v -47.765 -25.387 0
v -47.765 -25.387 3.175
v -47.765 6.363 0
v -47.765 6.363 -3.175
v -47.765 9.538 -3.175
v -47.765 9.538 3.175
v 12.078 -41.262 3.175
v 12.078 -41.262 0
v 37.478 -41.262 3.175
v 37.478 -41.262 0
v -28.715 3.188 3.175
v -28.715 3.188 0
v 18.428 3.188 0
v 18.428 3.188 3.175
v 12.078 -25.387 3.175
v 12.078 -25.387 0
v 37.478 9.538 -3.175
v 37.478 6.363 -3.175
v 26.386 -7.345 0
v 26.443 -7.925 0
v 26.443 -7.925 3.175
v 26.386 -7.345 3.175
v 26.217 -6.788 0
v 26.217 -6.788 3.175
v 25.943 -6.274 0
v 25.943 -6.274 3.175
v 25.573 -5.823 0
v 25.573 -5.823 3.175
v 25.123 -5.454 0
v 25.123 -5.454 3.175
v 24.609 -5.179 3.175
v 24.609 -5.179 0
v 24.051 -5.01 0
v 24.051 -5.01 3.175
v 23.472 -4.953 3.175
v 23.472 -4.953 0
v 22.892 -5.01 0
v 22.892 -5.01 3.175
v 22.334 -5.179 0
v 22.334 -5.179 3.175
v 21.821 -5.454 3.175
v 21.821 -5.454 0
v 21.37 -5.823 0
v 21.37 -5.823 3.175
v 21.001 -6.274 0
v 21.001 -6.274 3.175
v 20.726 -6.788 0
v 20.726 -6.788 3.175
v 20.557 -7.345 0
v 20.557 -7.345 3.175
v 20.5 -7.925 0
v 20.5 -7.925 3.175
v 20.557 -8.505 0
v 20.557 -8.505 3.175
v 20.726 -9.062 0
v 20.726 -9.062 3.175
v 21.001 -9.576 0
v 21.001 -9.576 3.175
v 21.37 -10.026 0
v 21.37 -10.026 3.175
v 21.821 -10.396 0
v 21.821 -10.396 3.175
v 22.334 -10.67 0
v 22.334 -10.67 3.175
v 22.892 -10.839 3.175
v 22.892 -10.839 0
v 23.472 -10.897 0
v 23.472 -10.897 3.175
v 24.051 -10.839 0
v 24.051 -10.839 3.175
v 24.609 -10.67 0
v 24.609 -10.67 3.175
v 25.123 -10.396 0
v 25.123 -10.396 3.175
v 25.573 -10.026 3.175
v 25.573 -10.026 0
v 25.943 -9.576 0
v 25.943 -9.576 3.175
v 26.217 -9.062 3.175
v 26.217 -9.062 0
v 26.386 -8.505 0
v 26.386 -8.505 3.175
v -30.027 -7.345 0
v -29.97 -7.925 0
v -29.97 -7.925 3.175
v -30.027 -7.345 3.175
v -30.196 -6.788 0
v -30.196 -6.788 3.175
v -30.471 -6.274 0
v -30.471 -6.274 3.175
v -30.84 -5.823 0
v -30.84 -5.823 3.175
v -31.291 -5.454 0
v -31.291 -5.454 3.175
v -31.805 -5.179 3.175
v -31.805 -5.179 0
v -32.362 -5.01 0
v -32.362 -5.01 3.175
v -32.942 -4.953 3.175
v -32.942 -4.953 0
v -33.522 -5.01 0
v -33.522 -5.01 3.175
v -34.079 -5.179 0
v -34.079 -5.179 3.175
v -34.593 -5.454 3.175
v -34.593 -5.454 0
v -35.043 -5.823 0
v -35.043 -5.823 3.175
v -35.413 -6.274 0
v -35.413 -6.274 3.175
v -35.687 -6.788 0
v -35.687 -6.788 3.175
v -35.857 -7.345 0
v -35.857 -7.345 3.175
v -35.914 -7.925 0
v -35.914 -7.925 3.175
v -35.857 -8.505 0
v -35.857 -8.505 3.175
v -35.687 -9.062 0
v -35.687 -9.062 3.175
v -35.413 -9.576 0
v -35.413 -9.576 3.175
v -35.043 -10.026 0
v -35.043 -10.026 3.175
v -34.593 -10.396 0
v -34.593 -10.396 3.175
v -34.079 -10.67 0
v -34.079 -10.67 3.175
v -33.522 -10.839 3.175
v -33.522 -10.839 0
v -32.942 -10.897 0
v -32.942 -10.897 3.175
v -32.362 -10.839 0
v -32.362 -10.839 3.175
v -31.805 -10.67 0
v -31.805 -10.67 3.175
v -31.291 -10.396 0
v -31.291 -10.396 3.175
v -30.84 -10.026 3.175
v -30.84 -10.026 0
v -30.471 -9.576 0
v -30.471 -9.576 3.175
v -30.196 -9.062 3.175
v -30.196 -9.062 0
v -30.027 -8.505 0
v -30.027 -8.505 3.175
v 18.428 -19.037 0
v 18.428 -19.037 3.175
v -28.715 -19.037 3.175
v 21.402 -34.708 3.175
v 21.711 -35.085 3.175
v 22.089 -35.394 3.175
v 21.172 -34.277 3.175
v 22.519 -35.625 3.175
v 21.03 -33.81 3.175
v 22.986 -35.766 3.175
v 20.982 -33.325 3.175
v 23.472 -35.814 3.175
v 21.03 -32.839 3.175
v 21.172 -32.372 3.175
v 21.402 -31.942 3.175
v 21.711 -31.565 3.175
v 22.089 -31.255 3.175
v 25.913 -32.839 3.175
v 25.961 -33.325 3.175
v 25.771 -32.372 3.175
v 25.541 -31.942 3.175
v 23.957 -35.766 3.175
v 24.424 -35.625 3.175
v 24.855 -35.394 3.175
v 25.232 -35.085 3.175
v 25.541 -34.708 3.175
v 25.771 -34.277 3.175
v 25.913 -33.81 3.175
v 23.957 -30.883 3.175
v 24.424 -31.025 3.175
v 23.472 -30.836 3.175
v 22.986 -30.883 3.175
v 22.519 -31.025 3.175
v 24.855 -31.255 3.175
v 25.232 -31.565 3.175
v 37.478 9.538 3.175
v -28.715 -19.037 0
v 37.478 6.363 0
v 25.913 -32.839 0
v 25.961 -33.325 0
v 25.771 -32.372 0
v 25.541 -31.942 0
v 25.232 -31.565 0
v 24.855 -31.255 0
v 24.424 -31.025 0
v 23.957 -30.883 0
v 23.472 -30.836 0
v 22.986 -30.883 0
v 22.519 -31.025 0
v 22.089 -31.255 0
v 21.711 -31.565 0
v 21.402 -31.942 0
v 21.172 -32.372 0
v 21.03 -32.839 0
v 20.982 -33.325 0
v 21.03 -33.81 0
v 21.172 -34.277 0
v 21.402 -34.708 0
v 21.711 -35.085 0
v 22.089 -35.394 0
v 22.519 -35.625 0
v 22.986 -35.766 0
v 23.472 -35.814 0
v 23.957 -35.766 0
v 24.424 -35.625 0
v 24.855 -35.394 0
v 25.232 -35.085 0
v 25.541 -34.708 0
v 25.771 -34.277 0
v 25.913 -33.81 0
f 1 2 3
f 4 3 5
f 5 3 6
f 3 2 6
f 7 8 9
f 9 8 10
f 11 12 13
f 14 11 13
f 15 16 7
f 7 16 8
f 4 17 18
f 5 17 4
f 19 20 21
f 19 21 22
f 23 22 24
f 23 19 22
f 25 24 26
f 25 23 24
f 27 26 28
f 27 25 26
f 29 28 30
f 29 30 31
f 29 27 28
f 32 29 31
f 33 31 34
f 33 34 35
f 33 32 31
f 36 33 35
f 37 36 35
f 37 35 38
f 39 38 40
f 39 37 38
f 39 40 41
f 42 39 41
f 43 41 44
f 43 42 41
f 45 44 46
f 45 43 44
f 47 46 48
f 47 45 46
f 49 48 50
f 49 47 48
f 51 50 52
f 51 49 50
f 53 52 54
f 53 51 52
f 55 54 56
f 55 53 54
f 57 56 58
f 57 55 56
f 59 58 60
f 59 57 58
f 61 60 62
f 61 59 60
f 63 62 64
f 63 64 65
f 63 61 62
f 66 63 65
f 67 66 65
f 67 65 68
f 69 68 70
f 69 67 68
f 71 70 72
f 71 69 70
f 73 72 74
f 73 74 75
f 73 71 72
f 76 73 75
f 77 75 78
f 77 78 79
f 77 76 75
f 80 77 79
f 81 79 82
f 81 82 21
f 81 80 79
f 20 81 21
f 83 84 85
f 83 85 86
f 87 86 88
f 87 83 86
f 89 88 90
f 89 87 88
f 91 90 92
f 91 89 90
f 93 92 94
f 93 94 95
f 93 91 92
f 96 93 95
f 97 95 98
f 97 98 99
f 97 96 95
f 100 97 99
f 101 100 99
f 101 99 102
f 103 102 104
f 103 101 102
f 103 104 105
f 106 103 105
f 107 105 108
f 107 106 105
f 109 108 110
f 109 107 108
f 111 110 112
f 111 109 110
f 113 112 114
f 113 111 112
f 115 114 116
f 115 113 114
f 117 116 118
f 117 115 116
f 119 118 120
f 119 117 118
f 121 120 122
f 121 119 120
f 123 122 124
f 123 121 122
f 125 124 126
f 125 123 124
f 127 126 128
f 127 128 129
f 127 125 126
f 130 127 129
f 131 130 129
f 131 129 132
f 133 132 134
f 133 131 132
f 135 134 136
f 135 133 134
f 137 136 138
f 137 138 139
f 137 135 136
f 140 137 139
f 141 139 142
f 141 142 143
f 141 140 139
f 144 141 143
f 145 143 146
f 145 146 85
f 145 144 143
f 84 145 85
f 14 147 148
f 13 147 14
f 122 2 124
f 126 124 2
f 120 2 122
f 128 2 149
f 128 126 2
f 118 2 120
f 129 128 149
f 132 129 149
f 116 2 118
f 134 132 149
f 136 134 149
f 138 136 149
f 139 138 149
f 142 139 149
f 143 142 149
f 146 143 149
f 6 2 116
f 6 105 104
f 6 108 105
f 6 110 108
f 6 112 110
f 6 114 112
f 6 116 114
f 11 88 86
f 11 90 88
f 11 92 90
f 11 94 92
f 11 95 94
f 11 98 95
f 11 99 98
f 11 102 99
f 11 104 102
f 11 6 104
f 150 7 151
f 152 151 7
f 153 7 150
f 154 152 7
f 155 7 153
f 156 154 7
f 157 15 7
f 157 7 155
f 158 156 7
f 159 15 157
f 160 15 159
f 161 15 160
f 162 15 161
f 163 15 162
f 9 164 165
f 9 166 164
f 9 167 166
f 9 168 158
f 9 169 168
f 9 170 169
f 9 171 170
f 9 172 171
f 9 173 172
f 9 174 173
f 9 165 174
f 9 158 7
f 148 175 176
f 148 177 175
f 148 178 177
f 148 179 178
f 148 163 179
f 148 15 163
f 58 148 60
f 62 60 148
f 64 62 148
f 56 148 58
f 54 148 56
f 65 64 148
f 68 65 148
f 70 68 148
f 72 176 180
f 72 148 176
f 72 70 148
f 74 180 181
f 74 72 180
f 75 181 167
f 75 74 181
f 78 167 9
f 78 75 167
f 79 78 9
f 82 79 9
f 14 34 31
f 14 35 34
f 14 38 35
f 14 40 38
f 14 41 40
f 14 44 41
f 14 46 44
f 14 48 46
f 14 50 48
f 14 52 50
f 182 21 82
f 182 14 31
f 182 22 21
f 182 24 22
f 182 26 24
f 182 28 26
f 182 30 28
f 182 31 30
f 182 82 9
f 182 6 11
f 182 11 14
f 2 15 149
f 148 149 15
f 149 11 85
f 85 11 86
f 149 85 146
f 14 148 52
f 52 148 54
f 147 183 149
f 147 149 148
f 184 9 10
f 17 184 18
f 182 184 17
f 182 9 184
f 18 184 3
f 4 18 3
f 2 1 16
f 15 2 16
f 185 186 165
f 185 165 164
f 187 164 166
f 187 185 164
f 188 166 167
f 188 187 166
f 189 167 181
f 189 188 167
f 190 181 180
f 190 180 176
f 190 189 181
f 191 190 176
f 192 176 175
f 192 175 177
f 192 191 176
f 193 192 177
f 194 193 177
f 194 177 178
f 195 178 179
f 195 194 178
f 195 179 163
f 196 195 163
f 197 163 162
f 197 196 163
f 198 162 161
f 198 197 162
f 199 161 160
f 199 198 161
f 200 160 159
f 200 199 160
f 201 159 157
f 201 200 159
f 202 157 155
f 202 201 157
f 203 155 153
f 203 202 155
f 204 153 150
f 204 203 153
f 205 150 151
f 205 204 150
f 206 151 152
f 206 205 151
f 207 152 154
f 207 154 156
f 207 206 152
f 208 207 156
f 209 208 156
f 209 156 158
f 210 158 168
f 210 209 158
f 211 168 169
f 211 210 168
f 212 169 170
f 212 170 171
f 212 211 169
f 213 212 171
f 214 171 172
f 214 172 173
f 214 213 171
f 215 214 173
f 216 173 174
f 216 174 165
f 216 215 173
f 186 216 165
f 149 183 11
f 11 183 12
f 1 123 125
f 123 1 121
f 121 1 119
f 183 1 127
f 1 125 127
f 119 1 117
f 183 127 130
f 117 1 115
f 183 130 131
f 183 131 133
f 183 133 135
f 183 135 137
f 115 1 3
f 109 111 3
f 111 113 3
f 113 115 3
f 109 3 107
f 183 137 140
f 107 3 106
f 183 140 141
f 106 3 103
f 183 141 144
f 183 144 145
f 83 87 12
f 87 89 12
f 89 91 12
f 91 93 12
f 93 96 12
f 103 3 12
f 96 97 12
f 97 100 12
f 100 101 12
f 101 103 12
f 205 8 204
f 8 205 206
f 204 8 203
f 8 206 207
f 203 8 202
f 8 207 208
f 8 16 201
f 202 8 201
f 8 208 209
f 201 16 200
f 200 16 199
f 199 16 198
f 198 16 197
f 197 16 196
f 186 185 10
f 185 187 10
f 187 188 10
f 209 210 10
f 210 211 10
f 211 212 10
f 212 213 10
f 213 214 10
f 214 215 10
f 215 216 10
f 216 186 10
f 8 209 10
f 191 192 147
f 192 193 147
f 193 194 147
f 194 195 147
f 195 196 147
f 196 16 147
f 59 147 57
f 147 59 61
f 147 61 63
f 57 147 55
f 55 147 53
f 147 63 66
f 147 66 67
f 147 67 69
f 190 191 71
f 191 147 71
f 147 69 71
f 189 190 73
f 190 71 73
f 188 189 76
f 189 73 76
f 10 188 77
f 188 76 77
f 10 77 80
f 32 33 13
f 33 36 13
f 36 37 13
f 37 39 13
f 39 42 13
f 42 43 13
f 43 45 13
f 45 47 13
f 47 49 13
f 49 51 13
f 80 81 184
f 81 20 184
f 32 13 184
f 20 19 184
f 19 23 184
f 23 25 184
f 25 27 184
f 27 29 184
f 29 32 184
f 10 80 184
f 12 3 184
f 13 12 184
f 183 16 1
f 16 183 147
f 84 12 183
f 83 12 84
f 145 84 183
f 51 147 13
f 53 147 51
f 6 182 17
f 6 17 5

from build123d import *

# Parameters (mm, degrees)
SKETCH1_R           = 2.9718
SKETCH1_W           = 47.1424
SKETCH1_H           = 22.225
SKETCH1_R_2         = 2.4892
BOSS_EXTRUDE1_DEPTH = 3.175
SKETCH2_W           = 85.2424
SKETCH2_H           = 3.175
BOSS_EXTRUDE2_DEPTH = 3.175


with BuildPart() as part:
    # Sketch1 → Boss-Extrude1 (new body)
    with BuildSketch(Plane.XY):
        Polygon((37.4777, 9.5377), (24.7777, 9.5377), (-35.0647, 9.5377), (-47.7647, 9.5377), (-47.7647, -25.3873), (-35.0647, -25.3873), (12.0777, -25.3873), (24.7777, -25.3873), (37.4777, -25.3873), align=None)
        with Locations((-32.941818083, -7.9248)):
            Circle(SKETCH1_R, mode=Mode.SUBTRACT)
        with Locations((-5.1435, -7.9248)):
            Rectangle(SKETCH1_W, SKETCH1_H, mode=Mode.SUBTRACT)
        with Locations((23.471581917, -7.9248)):
            Circle(SKETCH1_R, mode=Mode.SUBTRACT)
        Polygon((37.4777, -41.2623), (37.4777, -25.3873), (24.7777, -25.3873), (12.0777, -25.3873), (12.0777, -41.2623), align=None)
        with Locations((23.471581917, -33.3248)):
            Circle(SKETCH1_R_2, mode=Mode.SUBTRACT)
    extrude(amount=BOSS_EXTRUDE1_DEPTH)

    # Sketch2 → Boss-Extrude2 (add)
    with BuildSketch(Plane(origin=(0, 0, 0), x_dir=(-1, 0, 0), z_dir=(0, 0, -1))):
        with Locations((5.1435, 7.9502)):
            Rectangle(SKETCH2_W, SKETCH2_H)
    extrude(amount=BOSS_EXTRUDE2_DEPTH)


solid = part.part
